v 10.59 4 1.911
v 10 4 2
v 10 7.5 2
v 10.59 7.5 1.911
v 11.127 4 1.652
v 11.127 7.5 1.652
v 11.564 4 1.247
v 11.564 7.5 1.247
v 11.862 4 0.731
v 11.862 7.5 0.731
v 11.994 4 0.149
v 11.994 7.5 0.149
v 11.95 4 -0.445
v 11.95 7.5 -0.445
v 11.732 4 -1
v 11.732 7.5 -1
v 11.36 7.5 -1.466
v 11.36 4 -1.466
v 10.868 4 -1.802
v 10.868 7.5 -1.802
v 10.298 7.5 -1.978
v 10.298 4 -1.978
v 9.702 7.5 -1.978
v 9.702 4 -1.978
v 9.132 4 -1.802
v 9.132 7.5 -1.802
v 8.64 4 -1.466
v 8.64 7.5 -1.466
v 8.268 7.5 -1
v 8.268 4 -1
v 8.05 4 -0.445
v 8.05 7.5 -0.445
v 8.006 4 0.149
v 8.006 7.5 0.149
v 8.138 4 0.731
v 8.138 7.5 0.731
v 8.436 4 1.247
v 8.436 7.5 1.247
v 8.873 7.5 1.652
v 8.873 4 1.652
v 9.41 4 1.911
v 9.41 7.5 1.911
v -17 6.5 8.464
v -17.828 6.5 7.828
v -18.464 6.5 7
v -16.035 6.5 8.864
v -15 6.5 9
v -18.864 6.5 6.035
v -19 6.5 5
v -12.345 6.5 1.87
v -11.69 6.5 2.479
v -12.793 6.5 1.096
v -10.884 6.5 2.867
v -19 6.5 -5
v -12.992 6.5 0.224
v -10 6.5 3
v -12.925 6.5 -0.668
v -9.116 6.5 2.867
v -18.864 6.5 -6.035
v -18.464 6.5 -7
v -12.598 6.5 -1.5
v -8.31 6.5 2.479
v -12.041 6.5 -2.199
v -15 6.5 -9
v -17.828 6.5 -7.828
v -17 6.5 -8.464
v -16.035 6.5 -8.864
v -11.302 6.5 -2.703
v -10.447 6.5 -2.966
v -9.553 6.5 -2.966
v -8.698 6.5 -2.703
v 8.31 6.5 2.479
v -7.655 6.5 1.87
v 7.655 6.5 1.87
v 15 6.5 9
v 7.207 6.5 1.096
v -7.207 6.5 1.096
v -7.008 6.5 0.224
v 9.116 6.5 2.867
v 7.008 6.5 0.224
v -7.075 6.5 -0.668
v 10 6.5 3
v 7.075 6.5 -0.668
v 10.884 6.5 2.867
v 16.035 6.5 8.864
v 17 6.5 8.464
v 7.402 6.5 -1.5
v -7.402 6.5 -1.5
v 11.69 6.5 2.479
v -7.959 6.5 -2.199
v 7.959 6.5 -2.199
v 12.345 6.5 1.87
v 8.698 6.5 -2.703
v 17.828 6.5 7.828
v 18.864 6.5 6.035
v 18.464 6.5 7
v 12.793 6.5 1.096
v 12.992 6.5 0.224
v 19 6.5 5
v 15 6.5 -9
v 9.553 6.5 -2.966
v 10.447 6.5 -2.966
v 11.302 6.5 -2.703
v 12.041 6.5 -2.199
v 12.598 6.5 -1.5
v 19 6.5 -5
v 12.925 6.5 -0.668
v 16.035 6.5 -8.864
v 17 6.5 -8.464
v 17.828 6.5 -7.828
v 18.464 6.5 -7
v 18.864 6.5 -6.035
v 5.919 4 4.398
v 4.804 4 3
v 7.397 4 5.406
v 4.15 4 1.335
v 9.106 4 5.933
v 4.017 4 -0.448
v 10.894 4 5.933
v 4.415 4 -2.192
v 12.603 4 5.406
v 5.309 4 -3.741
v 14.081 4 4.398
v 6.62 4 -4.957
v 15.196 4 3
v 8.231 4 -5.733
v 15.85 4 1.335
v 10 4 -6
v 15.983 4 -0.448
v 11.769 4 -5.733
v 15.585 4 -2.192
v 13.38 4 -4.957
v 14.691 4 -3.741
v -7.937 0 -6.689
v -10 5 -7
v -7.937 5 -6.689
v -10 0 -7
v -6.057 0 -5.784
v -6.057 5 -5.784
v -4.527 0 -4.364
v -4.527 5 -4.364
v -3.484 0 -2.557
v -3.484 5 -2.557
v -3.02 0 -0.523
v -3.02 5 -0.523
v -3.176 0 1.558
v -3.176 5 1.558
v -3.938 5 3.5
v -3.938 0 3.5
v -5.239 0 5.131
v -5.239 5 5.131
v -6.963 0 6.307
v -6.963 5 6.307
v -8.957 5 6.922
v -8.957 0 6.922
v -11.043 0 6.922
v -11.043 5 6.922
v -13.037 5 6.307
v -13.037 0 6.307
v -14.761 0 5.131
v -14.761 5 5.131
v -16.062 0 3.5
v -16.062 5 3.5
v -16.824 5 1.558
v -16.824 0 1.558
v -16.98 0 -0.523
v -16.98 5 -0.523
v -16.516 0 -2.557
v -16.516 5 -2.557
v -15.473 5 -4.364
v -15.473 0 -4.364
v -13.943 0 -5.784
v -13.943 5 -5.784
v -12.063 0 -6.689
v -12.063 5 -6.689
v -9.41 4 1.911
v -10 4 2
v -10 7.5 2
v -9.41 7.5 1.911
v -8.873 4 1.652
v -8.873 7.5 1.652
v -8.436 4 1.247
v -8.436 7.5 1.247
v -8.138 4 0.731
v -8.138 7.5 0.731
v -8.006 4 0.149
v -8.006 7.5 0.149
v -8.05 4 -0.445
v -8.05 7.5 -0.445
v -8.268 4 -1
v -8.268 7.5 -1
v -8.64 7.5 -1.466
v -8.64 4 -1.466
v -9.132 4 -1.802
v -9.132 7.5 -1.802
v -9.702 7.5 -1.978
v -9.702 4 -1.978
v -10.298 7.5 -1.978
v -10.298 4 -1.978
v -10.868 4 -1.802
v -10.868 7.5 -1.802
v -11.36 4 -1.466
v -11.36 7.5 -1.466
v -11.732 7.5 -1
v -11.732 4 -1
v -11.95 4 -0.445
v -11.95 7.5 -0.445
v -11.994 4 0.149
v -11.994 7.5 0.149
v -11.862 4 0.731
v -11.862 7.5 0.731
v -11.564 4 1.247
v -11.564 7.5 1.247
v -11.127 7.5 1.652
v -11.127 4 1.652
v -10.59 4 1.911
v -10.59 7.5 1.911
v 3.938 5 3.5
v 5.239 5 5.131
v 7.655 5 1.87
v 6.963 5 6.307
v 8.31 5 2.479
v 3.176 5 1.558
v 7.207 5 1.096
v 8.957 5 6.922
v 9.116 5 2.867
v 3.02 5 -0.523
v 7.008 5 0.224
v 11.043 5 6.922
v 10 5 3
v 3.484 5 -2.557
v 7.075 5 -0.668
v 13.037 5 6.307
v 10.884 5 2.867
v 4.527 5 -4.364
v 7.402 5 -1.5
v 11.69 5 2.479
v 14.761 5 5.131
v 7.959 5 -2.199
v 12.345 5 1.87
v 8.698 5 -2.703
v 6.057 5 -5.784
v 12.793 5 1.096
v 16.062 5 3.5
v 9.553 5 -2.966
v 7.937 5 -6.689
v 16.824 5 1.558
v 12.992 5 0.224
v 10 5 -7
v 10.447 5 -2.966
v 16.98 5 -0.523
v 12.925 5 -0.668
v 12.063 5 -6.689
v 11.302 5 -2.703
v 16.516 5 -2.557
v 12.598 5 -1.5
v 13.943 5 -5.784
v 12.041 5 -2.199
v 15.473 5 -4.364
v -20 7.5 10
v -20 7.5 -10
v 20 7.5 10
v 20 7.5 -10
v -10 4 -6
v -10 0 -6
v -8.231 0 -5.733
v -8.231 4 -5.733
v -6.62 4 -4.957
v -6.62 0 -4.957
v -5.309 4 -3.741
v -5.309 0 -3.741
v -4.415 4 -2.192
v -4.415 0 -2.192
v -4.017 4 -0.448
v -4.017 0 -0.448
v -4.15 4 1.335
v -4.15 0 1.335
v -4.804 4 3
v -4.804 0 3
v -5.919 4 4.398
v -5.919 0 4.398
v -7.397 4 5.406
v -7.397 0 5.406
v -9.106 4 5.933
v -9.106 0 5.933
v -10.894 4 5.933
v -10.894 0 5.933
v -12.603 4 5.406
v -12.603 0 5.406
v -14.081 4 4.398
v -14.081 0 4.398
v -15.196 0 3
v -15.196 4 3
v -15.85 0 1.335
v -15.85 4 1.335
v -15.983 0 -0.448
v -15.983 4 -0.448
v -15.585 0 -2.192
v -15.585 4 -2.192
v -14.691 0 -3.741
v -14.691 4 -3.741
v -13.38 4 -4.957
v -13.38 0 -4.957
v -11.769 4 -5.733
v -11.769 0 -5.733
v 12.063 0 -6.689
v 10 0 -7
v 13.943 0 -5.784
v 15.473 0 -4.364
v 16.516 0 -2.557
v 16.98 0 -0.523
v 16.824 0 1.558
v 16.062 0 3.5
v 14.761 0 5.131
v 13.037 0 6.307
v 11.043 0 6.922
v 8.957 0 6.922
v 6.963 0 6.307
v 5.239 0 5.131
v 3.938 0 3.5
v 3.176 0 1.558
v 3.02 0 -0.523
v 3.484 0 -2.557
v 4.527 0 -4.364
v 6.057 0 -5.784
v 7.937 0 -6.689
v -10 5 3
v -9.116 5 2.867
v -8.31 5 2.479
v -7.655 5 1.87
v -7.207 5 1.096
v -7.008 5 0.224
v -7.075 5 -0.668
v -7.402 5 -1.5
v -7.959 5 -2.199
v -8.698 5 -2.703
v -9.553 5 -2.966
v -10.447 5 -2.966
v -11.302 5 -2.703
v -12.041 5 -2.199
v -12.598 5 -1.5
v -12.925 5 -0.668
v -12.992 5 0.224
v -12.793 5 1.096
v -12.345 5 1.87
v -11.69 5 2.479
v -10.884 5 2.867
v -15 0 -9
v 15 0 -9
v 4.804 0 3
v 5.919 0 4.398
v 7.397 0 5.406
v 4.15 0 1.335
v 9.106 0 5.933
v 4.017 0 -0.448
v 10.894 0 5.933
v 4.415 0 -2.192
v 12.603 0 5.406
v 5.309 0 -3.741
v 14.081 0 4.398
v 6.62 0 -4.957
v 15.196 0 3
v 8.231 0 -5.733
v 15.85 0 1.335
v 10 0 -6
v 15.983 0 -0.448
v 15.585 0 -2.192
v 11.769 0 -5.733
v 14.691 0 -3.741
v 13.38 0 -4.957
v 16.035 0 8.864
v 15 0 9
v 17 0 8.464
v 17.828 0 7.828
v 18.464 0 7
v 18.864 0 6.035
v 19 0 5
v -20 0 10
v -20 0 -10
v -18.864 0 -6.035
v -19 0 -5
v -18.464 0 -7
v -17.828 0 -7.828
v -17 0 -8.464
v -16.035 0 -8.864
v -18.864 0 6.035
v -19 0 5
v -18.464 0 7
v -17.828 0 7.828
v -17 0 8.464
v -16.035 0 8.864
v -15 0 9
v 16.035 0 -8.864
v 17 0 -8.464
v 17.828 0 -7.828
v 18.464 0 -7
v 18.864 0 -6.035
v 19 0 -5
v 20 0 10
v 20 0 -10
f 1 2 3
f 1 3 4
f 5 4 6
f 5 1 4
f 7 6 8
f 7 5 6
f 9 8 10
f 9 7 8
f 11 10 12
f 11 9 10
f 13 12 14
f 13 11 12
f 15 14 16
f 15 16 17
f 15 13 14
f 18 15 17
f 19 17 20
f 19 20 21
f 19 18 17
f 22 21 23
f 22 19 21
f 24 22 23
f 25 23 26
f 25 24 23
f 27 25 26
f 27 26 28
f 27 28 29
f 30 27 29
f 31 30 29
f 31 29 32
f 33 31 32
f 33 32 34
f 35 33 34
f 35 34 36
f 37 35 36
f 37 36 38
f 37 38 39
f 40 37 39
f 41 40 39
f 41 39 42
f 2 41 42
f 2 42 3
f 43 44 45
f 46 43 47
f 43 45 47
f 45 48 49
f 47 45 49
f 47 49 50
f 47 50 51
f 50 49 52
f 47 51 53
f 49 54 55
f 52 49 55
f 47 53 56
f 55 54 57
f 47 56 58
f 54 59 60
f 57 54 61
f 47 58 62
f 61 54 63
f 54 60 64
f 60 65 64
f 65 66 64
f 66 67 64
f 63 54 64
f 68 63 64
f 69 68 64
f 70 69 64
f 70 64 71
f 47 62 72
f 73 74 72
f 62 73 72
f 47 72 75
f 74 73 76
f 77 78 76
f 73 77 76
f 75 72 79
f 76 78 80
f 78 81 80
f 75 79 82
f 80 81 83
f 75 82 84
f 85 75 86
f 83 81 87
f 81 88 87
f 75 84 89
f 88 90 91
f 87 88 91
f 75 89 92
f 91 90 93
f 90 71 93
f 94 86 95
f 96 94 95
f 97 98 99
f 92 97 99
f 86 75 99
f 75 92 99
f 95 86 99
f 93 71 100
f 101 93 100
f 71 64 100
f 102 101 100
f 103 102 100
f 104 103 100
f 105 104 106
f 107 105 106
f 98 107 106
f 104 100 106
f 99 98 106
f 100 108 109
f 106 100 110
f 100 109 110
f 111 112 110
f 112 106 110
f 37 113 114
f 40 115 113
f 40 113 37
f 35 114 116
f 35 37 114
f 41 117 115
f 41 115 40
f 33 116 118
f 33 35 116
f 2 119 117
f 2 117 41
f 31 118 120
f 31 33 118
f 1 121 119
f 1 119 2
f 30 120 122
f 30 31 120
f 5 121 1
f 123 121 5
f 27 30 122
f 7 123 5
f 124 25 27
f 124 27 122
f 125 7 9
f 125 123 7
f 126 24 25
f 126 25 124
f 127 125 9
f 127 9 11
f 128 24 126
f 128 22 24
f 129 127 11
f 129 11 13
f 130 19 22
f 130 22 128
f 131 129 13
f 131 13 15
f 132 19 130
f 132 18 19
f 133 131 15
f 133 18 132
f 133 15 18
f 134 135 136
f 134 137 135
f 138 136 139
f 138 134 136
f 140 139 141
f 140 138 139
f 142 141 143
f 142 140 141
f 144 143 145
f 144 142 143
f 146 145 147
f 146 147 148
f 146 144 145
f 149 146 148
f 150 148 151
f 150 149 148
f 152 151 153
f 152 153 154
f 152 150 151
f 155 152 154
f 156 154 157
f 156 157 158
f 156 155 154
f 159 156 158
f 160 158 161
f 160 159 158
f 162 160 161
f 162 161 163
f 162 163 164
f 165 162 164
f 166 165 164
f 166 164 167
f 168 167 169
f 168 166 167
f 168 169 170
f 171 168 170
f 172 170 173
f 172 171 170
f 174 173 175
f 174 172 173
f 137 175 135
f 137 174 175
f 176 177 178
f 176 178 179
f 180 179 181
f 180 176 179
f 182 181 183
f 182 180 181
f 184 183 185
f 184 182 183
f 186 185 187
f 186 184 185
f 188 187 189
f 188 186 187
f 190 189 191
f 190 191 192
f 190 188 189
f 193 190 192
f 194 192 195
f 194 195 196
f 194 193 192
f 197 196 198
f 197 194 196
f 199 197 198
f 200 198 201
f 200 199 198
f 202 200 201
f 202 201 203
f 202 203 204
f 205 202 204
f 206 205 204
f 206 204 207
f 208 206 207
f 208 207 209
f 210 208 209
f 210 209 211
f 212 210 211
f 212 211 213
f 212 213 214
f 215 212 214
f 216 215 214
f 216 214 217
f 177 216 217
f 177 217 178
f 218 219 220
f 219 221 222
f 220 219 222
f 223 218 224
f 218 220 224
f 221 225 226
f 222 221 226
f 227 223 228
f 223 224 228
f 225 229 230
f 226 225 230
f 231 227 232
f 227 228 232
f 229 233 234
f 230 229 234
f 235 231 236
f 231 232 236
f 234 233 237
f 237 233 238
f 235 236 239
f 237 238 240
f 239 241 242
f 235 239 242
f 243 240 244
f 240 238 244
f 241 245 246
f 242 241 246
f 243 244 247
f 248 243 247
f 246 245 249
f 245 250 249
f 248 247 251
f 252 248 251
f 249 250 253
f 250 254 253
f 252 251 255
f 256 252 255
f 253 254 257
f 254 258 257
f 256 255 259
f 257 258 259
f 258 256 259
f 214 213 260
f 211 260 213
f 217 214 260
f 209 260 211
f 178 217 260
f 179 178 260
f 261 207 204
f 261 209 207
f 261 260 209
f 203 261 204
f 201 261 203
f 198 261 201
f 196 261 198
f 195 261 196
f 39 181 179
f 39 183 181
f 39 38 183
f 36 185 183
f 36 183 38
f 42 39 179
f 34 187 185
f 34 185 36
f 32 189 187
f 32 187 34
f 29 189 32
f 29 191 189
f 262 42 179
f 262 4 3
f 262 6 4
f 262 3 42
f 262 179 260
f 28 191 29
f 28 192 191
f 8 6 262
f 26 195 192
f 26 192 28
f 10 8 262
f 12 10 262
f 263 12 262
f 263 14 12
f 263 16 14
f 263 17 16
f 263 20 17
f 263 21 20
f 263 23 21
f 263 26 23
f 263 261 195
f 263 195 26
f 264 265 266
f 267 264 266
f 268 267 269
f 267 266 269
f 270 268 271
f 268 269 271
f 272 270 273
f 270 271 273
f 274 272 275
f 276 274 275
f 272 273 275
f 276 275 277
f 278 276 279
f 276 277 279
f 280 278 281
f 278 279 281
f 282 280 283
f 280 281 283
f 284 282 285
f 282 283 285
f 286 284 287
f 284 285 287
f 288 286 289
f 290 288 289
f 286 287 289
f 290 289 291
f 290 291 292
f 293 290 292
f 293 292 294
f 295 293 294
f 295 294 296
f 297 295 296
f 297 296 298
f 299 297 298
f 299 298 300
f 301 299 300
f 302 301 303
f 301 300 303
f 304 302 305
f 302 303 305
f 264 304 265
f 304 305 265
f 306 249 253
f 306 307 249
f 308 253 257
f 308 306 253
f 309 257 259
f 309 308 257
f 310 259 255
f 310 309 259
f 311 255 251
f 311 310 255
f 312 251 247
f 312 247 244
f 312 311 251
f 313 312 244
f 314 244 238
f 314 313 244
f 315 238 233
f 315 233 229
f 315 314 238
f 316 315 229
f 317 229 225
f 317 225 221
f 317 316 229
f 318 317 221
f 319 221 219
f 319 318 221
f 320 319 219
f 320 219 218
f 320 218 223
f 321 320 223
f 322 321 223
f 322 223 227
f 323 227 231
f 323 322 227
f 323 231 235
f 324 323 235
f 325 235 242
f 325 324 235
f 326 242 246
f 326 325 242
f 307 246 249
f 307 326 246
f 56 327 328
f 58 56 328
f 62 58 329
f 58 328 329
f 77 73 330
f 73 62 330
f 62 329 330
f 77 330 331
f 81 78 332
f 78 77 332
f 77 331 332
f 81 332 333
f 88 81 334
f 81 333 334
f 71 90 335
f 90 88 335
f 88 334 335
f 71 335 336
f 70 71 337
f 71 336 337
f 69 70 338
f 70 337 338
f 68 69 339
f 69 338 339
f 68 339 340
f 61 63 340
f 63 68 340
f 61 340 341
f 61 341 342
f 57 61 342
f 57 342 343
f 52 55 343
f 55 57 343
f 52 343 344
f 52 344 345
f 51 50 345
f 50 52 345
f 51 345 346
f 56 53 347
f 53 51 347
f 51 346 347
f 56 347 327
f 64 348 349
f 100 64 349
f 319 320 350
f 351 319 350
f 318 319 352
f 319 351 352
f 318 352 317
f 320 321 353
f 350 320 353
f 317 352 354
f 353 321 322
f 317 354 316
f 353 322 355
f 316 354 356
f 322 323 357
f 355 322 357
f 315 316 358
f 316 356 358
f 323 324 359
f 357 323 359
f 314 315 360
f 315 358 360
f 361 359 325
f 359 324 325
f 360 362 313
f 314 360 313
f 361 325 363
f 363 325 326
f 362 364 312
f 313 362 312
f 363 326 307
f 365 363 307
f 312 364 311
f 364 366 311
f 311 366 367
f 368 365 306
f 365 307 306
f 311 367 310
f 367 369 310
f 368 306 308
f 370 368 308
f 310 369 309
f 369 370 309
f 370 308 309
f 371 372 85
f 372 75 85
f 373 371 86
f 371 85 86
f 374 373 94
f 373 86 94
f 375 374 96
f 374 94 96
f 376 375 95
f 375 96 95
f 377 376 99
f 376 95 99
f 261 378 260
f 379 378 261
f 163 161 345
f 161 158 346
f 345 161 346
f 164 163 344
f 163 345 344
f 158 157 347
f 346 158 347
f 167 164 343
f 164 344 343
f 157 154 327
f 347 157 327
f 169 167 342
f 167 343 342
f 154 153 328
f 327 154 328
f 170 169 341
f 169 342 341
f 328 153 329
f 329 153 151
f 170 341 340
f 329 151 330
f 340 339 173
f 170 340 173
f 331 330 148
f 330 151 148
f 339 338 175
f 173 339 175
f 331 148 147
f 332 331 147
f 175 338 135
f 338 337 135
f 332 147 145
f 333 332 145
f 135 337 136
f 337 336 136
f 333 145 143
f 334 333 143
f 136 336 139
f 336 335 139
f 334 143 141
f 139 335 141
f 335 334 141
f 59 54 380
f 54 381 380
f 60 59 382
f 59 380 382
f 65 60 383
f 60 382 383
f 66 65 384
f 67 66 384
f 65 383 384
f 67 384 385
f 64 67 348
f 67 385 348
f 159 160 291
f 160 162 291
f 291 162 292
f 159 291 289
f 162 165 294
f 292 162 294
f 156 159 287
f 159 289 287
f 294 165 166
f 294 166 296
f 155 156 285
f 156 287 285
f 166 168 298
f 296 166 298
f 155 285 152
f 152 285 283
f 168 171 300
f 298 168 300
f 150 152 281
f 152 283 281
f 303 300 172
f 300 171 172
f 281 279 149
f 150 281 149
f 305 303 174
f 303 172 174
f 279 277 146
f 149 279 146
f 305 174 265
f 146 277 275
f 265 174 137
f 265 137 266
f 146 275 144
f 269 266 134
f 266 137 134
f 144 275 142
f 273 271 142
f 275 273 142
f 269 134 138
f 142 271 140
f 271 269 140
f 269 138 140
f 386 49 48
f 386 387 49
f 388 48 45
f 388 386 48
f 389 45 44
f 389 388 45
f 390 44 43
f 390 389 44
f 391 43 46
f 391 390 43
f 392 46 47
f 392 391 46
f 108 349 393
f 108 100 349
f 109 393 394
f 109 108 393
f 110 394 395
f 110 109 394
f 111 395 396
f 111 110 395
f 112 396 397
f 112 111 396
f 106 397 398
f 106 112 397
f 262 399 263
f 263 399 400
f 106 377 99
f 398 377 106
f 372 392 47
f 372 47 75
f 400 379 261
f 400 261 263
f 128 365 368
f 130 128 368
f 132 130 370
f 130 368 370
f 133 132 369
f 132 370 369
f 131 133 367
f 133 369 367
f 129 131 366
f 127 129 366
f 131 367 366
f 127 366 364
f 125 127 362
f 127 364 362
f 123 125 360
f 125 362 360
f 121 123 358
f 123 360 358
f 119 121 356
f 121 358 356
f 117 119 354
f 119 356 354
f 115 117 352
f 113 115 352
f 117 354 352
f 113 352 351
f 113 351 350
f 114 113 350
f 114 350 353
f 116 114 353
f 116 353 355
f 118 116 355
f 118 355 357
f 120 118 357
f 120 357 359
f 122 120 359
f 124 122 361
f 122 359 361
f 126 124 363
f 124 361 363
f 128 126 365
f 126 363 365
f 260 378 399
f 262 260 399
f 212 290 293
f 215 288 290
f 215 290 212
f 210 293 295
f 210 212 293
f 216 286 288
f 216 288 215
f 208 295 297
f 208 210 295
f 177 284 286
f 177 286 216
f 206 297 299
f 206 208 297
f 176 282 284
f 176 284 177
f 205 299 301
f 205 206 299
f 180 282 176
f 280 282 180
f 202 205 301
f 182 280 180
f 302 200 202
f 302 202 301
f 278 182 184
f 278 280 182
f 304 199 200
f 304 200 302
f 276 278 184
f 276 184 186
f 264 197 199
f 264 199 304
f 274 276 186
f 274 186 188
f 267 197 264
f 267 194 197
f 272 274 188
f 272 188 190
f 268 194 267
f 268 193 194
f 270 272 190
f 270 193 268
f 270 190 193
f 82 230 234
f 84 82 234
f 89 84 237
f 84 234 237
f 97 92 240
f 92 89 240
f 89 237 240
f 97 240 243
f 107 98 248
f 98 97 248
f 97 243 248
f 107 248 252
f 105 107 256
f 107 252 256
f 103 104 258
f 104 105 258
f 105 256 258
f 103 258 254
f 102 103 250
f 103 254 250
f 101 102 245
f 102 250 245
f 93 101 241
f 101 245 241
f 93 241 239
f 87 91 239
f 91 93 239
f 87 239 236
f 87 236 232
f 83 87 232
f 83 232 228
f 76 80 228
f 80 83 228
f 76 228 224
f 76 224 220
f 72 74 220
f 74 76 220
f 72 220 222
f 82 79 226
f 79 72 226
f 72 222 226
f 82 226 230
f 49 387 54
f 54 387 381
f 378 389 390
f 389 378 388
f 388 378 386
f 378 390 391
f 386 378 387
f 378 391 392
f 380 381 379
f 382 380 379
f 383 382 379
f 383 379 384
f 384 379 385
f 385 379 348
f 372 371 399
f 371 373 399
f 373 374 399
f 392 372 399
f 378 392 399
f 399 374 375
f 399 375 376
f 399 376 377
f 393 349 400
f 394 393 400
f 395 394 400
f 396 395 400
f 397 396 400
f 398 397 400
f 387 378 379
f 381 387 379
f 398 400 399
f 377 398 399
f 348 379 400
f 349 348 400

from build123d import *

# Parameters (mm, degrees)
CROQUIS1_W              = 40
CROQUIS1_H              = 20
CROQUIS1_R              = 2
SALIENTE_EXTRUIR1_DEPTH = 7.5
CROQUIS2_R              = 6
CORTAR_EXTRUIR1_DEPTH   = 4
VACIADO3_T              = -1
REDONDEO1_R             = 4


with BuildPart() as part:
    # Croquis1 → Saliente-Extruir1 (new body)
    with BuildSketch(Plane(origin=(0, 0, 0), x_dir=(1, 0, 0), z_dir=(0, 1, 0))):
        Rectangle(CROQUIS1_W, CROQUIS1_H)
        with Locations(Location((-10, 0, 0), (0, 0, 270))):
            Circle(CROQUIS1_R, mode=Mode.SUBTRACT)
        with Locations(Location((10, 0, 0), (0, 0, 270))):
            Circle(CROQUIS1_R, mode=Mode.SUBTRACT)
    extrude(amount=SALIENTE_EXTRUIR1_DEPTH)

    # Croquis2 → Cortar-Extruir1 (cut)
    with BuildSketch(Plane.XZ):
        with Locations(Location((-10, 0, 0), (0, 0, 270))):
            Circle(CROQUIS2_R)
        with Locations(Location((10, 0, 0), (0, 0, 270))):
            Circle(CROQUIS2_R)
    extrude(amount=-CORTAR_EXTRUIR1_DEPTH, mode=Mode.SUBTRACT)

    # Vaciado3
    vaciado3_openings = [part.faces().sort_by_distance(p)[0] for p in [
        (0, 0, 0),
    ]]
    offset(amount=VACIADO3_T, openings=vaciado3_openings, kind=Kind.INTERSECTION)

    # Redondeo1
    redondeo1_edges = [part.edges().sort_by_distance(p)[0] for p in [
        (-19, 3.25, -9),
        (-19, 3.25, 9),
        (19, 3.25, 9),
        (19, 3.25, -9),
    ]]
    fillet(redondeo1_edges, radius=REDONDEO1_R)


solid = part.part
